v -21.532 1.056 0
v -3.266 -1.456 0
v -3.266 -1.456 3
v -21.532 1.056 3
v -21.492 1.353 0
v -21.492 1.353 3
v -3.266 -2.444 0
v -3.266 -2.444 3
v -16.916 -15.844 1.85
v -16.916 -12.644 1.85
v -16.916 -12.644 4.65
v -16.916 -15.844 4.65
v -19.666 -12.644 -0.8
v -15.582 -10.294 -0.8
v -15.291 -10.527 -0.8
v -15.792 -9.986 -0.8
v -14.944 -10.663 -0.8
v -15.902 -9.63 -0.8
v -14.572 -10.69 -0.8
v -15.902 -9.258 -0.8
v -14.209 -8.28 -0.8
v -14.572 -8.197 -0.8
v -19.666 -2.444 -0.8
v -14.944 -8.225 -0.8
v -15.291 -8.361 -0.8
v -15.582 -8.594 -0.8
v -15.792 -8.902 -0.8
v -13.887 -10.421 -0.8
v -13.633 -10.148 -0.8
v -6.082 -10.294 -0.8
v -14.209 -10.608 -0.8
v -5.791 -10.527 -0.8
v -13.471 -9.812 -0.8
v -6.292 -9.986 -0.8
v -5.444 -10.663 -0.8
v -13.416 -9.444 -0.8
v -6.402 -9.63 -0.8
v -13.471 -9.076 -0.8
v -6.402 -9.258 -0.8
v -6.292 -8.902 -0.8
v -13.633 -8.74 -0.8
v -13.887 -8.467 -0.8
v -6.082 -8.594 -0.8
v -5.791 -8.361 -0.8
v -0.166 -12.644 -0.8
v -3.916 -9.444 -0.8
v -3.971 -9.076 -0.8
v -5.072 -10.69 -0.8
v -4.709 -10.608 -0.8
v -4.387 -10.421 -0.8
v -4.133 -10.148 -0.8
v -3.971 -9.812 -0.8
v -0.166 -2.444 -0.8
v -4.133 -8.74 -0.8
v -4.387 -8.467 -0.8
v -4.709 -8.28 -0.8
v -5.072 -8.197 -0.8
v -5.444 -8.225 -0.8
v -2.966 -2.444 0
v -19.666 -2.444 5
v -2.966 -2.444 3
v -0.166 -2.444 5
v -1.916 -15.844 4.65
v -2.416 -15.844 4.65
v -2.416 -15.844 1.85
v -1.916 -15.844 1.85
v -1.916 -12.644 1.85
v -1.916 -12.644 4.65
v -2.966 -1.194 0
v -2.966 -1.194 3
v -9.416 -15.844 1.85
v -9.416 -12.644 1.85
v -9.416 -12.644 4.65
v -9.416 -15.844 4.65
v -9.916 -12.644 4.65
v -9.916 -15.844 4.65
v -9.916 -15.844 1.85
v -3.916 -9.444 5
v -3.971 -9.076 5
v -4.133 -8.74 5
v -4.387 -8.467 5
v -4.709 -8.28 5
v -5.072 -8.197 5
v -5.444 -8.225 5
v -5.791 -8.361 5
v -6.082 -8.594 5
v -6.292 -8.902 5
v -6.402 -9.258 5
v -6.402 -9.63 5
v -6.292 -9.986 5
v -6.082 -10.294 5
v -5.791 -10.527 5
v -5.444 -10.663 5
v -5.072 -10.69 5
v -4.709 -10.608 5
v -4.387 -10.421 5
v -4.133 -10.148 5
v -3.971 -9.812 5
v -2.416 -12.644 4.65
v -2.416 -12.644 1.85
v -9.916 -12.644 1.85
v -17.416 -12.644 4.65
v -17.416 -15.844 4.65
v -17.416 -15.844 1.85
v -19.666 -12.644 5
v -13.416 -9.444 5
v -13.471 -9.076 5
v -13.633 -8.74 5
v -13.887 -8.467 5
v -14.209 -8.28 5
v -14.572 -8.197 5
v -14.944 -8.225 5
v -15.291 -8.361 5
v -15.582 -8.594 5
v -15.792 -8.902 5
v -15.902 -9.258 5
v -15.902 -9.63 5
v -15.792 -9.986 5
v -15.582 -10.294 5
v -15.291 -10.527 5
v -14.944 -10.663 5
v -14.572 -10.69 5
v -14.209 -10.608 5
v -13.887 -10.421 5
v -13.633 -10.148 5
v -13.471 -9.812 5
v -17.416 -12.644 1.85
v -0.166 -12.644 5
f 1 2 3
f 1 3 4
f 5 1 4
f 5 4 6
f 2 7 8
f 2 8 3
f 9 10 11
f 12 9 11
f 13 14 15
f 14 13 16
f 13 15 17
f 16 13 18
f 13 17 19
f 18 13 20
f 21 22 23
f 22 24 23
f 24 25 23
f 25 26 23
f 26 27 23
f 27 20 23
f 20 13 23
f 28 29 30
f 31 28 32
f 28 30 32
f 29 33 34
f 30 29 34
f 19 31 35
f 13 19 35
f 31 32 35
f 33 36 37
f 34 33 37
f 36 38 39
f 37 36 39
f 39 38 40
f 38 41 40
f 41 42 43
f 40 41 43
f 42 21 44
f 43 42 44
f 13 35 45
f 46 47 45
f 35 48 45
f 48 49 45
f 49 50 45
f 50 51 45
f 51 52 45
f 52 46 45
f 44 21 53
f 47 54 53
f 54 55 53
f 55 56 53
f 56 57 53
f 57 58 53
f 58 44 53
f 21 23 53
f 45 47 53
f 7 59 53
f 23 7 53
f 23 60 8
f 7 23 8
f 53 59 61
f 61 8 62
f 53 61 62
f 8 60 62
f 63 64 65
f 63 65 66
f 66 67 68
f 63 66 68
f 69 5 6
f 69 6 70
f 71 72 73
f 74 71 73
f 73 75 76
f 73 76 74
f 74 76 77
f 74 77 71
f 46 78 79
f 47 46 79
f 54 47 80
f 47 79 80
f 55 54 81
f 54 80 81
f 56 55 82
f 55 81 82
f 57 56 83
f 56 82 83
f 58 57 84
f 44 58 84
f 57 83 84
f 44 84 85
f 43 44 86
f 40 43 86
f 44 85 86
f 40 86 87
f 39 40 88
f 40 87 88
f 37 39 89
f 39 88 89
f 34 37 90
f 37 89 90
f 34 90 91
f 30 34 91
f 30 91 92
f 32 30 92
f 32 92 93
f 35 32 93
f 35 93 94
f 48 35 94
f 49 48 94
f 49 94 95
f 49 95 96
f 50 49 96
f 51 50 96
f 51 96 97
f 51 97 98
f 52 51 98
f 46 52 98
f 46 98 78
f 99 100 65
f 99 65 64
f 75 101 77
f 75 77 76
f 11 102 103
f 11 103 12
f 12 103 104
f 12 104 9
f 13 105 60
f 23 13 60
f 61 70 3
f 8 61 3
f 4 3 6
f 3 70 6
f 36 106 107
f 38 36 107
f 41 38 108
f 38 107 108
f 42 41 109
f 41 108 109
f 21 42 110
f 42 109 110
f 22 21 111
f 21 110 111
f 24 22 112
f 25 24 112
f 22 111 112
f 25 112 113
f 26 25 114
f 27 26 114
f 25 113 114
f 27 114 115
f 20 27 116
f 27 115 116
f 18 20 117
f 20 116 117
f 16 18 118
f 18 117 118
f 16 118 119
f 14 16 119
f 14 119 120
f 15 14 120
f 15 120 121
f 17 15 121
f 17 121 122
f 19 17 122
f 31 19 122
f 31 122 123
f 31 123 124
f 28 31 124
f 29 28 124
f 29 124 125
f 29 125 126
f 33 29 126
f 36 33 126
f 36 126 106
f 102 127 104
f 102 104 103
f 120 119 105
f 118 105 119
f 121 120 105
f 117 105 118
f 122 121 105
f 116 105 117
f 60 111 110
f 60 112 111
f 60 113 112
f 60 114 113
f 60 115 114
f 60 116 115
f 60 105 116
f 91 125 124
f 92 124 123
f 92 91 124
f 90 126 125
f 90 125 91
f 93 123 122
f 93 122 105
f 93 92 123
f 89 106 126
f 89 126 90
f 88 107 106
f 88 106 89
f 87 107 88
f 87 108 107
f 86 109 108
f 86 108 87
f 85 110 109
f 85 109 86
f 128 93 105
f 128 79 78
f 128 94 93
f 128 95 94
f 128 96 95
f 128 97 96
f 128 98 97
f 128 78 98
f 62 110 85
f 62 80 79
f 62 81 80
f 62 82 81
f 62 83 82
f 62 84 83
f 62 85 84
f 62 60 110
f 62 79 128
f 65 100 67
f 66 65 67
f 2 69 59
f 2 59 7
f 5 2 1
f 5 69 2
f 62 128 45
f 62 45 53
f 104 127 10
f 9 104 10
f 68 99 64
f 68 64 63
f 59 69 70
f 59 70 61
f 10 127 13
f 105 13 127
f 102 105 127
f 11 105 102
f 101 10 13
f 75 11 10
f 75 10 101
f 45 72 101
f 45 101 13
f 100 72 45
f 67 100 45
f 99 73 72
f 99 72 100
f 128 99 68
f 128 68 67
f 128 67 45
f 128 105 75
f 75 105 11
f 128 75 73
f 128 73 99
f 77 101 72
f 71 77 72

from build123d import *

# Parameters (mm, degrees)
SKETCH1_W                      = 19.5
SKETCH1_H                      = 10.2
BOSS_EXTRUDE1_DEPTH            = 5.8
SKETCH4_W                      = 0.5
SKETCH4_H                      = 2.8
BOSS_EXTRUDE4_DEPTH            = 3.2
SKETCH5_W                      = 0.5
SKETCH5_H                      = 2.8
BOSS_EXTRUDE5_DEPTH            = 3.2
SKETCH6_W                      = 0.5
SKETCH6_H                      = 2.8
BOSS_EXTRUDE6_DEPTH            = 3.2
F_2_5_2_5_DIAMETER_HOLE1_D     = 2.5
F_2_5_2_5_DIAMETER_HOLE1_DEPTH = 10
F_2_5_2_5_DIAMETER_HOLE1_TIP   = 0.751075774
BOSS_EXTRUDE7_DEPTH            = 3


with BuildPart() as part:
    # Sketch1 → Boss-Extrude1 (new body)
    with BuildSketch(Plane.XY.offset(5)):
        with Locations((-9.915879305, -7.543983402)):
            Rectangle(SKETCH1_W, SKETCH1_H)
    extrude(amount=-BOSS_EXTRUDE1_DEPTH)

    # Sketch4 → Boss-Extrude4 (add)
    with BuildSketch(Plane.XZ.offset(12.643983402)):
        with Locations((-9.665879305, 3.25)):
            Rectangle(SKETCH4_W, SKETCH4_H)
    extrude(amount=BOSS_EXTRUDE4_DEPTH)

    # Sketch5 → Boss-Extrude5 (add)
    with BuildSketch(Plane.XZ.offset(12.643983402)):
        with Locations((-17.165879305, 3.25)):
            Rectangle(SKETCH5_W, SKETCH5_H)
    extrude(amount=BOSS_EXTRUDE5_DEPTH)

    # Sketch6 → Boss-Extrude6 (add)
    with BuildSketch(Plane.XZ.offset(12.643983402)):
        with Locations((-2.165879305, 3.25)):
            Rectangle(SKETCH6_W, SKETCH6_H)
    extrude(amount=BOSS_EXTRUDE6_DEPTH)

    # Ø2.5 (2.5) Diameter Hole1
    with Locations(Plane(origin=(0, 0, -0.8), x_dir=(-1, 0, 0), z_dir=(0, 0, -1))):
        with Locations((14.665879305, -9.443983402), (5.165879305, -9.443983402)):
            Hole(F_2_5_2_5_DIAMETER_HOLE1_D / 2, depth=F_2_5_2_5_DIAMETER_HOLE1_DEPTH)
            with Locations((0, 0, -(F_2_5_2_5_DIAMETER_HOLE1_DEPTH + F_2_5_2_5_DIAMETER_HOLE1_TIP / 2))):  # 118° drill point
                Cone(0, F_2_5_2_5_DIAMETER_HOLE1_D / 2, F_2_5_2_5_DIAMETER_HOLE1_TIP, mode=Mode.SUBTRACT)

    # Sketch9 → Boss-Extrude7 (add)
    with BuildSketch(Plane.XY):
        Polygon((-2.965879305, -1.193983402), (-2.965879305, -2.443983402), (-3.265879305, -2.443983402), (-3.265879305, -1.455557189), (-21.532448725, 1.056016598), (-21.491584492, 1.353220424), align=None)
    extrude(amount=BOSS_EXTRUDE7_DEPTH)


solid = part.part
